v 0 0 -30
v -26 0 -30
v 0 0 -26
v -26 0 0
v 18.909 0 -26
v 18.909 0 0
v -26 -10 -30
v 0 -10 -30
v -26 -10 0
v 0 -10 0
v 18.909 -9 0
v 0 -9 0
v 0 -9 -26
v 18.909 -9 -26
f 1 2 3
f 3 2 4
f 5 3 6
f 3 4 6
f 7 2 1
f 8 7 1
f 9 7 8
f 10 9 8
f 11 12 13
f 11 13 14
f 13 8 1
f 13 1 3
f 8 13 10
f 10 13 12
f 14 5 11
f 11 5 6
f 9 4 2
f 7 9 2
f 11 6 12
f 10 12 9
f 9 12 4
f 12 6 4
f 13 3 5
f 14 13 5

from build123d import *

# Parameters (mm, degrees)
F1_DEPTH = 10
F0_W     = 18.908922
F0_H     = 26
F2_DEPTH = 9
F4_DEPTH = 1


with BuildPart() as f1:
    # F0 (on Front) → F1 (new body)
    with BuildSketch(Plane.XZ):
        Polygon((0, -26), (0, 0), (-26, 0), (-26, -30), (0, -30), align=None)
    extrude(amount=F1_DEPTH)

    # F0 (on Front) → F2 (join)
    with BuildSketch(Plane.XZ):
        with Locations((9.454461, -13)):
            Rectangle(F0_W, F0_H)
    extrude(amount=F2_DEPTH)

    # F3 (on face) → F4 (cut)
    with BuildSketch(Plane.XZ):
        Polygon((21.377379, 0), (18.908922, 0), (18.908922, -26), (0, -26), (0, -30.423839), (21.377379, -30.423839), align=None)
    extrude(amount=F4_DEPTH, mode=Mode.SUBTRACT)


solid = f1.part
